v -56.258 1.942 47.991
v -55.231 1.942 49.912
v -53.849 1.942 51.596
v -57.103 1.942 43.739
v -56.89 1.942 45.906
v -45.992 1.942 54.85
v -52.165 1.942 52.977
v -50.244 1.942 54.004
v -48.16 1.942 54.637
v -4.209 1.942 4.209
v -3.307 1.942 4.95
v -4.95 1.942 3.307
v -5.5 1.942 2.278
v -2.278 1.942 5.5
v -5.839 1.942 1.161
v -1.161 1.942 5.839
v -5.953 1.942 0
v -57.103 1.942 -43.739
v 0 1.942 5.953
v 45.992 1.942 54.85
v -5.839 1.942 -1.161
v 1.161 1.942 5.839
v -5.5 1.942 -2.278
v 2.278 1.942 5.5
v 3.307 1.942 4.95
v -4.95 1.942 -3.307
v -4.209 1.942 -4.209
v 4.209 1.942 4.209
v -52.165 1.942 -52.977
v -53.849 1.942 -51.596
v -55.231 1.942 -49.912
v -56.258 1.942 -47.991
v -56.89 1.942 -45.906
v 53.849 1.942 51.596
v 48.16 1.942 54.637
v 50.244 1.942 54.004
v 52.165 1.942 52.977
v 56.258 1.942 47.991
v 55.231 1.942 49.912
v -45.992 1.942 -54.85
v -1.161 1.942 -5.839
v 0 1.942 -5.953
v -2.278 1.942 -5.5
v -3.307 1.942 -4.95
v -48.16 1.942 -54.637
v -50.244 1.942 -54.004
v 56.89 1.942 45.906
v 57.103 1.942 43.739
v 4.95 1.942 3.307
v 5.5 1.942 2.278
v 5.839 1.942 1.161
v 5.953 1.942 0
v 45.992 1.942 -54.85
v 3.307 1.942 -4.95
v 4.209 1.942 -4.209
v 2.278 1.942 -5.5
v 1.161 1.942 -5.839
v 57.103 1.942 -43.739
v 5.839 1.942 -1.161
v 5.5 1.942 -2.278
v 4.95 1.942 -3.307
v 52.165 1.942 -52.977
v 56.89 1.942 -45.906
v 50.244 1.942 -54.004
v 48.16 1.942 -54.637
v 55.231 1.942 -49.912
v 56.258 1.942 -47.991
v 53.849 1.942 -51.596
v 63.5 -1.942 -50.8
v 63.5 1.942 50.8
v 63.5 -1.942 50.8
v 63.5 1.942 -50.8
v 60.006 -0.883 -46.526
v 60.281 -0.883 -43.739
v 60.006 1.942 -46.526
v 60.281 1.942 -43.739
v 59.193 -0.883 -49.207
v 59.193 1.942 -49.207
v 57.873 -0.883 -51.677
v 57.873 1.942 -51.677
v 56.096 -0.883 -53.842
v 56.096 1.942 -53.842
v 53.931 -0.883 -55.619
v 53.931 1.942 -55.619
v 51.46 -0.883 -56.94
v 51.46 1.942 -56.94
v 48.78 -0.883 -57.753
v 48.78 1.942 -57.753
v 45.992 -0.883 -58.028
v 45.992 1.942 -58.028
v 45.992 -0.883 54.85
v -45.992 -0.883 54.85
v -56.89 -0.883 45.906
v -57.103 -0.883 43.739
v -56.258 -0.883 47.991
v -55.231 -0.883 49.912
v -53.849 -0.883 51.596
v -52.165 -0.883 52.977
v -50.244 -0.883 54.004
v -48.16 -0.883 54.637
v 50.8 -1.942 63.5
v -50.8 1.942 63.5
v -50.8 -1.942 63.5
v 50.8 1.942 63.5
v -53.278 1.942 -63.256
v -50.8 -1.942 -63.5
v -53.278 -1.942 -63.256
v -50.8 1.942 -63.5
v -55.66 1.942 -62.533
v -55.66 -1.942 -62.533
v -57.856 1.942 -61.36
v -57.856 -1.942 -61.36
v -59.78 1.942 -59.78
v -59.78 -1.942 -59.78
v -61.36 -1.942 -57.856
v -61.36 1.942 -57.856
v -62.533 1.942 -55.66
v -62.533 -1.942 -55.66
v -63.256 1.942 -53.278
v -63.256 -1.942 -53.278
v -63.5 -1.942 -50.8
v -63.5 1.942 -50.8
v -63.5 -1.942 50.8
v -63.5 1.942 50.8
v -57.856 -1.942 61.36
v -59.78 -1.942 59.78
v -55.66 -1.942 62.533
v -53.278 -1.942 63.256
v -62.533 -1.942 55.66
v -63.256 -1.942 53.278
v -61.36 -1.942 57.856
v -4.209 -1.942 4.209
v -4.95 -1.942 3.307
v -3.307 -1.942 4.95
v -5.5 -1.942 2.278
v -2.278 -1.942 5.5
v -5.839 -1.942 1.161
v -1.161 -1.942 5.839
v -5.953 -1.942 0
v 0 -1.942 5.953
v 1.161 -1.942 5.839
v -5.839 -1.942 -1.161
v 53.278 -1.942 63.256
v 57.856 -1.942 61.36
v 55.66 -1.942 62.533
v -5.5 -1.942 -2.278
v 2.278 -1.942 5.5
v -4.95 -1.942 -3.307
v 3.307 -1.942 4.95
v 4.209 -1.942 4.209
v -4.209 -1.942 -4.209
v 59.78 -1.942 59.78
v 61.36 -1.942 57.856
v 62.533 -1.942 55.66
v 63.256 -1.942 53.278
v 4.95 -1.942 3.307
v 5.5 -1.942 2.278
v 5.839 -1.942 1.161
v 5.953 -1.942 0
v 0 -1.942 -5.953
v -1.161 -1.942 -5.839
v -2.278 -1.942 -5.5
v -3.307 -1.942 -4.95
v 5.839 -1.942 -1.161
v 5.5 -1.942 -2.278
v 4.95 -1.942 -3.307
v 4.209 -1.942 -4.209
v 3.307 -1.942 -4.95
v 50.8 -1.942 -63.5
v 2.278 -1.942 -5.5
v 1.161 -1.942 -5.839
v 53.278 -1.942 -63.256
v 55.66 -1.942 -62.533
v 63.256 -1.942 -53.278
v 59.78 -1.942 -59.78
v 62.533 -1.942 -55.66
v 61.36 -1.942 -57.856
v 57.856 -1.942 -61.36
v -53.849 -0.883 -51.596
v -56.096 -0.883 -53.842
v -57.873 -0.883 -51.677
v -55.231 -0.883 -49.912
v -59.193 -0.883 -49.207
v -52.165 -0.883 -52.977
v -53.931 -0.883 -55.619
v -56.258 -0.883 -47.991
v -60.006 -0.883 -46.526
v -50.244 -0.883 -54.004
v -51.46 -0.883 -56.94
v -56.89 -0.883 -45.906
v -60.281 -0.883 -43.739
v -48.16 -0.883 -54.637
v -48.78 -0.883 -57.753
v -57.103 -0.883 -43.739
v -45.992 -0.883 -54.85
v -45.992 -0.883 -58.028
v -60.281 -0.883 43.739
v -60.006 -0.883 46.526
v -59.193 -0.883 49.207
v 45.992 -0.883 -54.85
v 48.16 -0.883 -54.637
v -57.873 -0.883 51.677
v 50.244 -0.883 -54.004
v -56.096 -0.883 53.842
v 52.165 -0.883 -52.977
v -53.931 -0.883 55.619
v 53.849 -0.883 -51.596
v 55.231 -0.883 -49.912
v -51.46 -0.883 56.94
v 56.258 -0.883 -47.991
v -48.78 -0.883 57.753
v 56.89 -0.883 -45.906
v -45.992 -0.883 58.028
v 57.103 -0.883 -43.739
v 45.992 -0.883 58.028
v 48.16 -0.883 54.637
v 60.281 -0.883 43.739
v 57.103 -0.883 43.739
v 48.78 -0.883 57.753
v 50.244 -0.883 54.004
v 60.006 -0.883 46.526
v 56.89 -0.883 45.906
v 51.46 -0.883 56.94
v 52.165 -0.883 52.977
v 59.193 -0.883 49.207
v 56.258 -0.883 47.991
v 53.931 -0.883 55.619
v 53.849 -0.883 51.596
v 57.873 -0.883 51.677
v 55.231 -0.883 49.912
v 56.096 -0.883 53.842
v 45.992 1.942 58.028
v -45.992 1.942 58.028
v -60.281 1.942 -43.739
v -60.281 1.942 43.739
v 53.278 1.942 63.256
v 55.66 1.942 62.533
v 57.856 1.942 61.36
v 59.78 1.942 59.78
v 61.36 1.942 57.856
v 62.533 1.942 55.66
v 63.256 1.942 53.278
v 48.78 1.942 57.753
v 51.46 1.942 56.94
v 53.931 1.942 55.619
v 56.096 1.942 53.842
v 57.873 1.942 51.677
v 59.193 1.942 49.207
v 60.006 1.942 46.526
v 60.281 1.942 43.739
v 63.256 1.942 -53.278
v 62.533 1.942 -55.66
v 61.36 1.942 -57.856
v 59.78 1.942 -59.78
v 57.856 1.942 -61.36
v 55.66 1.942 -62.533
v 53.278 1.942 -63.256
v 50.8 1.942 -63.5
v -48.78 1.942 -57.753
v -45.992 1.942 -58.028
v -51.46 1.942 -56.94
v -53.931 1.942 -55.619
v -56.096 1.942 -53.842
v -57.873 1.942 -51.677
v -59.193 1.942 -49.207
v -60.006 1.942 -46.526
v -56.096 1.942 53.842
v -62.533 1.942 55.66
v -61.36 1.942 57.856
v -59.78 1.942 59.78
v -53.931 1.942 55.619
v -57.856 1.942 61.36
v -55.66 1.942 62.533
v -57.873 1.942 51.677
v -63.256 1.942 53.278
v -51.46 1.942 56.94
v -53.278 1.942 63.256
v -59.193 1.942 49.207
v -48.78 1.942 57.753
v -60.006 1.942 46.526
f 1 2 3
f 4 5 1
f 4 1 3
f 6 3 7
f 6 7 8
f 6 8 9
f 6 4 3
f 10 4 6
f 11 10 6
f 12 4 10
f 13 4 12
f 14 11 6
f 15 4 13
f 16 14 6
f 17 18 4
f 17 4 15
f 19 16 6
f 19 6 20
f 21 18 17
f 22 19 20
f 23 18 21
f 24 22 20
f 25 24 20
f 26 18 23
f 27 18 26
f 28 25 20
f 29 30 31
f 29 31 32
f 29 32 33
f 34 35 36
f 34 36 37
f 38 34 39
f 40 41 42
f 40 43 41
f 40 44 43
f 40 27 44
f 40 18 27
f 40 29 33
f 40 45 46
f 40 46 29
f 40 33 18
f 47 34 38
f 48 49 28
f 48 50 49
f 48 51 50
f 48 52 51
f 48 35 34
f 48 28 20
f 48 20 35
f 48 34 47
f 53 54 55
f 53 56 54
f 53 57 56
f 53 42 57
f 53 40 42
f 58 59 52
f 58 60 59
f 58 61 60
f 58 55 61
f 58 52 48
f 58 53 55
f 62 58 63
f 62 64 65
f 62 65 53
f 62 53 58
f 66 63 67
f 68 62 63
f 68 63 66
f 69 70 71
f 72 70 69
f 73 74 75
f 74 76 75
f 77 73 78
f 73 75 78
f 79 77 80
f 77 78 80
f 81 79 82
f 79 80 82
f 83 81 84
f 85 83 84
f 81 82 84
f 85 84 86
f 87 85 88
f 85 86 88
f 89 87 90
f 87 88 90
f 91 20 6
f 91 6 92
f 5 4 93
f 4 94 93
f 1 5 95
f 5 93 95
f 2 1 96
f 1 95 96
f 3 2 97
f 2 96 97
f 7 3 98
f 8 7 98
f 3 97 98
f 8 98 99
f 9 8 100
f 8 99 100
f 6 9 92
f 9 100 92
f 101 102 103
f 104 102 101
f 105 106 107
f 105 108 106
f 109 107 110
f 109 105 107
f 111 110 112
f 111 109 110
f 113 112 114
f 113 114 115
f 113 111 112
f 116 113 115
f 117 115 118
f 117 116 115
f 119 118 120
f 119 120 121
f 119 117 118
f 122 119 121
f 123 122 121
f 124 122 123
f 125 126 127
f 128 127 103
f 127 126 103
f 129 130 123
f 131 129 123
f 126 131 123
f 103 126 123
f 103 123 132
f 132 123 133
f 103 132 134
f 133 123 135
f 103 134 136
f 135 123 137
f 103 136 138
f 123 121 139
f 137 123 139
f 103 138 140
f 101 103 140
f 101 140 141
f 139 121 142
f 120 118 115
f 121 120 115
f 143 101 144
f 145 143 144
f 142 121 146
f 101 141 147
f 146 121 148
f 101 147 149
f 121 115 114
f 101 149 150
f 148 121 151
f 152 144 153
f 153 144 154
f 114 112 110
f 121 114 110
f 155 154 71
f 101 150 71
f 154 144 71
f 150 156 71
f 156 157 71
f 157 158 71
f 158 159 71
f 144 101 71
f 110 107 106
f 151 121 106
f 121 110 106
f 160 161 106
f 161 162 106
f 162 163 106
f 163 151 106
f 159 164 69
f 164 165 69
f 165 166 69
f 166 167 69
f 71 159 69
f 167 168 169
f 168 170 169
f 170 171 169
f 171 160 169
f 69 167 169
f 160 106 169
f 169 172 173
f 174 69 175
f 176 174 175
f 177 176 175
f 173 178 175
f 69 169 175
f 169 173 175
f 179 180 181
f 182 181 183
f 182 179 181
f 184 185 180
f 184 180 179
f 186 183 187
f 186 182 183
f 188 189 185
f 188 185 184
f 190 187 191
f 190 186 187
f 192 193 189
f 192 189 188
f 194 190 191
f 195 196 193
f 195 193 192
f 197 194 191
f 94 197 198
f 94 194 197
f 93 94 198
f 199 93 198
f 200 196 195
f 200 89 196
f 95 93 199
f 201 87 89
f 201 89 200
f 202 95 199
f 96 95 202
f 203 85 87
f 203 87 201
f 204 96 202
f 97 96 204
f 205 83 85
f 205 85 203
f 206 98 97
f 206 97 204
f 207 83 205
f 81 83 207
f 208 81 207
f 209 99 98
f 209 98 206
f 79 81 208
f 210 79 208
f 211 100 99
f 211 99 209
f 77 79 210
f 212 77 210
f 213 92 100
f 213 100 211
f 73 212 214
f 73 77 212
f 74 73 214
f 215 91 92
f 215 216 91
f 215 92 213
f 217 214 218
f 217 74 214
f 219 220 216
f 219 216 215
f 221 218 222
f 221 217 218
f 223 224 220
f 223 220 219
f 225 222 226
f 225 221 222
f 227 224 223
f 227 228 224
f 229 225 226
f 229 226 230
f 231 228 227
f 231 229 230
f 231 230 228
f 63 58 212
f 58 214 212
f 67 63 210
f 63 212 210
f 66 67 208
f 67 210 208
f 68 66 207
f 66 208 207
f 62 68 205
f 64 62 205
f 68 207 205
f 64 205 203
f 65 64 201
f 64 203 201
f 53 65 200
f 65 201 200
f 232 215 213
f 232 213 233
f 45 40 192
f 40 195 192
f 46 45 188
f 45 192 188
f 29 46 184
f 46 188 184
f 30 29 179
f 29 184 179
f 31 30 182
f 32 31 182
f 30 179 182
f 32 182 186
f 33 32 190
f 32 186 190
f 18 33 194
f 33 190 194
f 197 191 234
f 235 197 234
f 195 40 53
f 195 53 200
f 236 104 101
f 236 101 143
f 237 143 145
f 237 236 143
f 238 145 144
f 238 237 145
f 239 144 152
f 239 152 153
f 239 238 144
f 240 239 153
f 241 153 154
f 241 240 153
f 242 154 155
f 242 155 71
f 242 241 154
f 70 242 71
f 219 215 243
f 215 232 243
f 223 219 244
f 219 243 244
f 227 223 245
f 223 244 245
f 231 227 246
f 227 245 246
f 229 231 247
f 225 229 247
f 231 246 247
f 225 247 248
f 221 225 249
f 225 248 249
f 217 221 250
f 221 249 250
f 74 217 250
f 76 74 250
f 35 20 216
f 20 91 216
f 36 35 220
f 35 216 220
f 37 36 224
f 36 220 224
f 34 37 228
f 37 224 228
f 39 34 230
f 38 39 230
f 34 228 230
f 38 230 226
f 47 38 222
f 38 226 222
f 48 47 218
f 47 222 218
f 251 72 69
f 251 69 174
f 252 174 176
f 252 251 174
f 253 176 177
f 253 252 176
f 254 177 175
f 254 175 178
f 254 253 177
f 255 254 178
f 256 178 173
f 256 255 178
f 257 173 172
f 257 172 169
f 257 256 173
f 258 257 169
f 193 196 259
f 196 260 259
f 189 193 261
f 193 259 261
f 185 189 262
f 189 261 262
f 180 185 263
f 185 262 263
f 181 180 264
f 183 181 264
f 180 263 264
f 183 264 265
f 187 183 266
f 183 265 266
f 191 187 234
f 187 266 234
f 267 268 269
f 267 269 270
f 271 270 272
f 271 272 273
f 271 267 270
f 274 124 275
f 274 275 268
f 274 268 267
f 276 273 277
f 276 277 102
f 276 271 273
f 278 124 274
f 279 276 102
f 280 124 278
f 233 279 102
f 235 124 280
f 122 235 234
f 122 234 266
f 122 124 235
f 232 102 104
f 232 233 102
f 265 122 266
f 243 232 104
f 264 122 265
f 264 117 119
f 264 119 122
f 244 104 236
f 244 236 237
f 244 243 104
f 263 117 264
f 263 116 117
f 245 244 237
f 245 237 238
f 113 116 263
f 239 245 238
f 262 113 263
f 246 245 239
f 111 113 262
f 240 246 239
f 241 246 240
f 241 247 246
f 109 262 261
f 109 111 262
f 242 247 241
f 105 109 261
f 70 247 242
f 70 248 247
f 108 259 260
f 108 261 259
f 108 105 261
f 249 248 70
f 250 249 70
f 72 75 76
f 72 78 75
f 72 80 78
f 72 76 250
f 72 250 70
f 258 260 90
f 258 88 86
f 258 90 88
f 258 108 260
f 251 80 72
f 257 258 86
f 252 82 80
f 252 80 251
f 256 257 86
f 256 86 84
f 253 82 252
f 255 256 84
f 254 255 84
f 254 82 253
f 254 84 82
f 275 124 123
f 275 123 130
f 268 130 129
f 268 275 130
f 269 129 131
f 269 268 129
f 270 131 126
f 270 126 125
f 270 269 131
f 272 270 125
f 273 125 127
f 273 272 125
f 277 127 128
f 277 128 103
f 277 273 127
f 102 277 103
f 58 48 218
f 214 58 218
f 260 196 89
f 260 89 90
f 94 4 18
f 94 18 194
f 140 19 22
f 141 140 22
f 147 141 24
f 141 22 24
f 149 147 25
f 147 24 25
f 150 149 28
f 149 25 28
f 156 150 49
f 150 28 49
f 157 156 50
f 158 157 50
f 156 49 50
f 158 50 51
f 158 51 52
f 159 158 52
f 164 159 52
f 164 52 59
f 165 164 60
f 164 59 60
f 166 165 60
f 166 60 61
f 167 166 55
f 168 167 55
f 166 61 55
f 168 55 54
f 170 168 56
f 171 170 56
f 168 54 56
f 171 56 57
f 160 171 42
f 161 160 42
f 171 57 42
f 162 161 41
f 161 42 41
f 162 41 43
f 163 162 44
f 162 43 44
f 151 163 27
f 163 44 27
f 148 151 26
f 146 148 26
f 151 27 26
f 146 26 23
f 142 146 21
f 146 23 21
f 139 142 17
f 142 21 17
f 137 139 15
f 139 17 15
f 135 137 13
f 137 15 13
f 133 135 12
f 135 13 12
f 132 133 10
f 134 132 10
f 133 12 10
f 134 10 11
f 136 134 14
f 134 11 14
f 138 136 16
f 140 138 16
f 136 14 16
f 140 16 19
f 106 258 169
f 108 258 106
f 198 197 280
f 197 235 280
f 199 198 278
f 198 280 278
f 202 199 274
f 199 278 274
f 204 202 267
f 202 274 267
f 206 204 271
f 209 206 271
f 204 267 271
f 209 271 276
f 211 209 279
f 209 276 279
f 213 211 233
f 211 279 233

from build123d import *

# Parameters (mm, degrees)
MAIN_BODY_DEPTH      = 1.94183
SKETCH29_R           = 5.953125
PNEUMATICMOUNT_DEPTH = 3.88366
ORINGINSERTPROFILE_W = 3.17754
ORINGINSERTPROFILE_H = 2.82448


with BuildPart() as part:
    # Sketch1 → main body (new, symmetric)
    with BuildSketch(Plane(origin=(0, 0, 0), x_dir=(1, 0, 0), z_dir=(0, 1, 0))):
        with BuildLine():
            Line((-63.5, 50.8), (-63.5, -50.8))
            ThreePointArc((-63.5, -50.8), (-59.780256121, -59.780256121), (-50.8, -63.5))
            Line((-50.8, -63.5), (50.8, -63.5))
            ThreePointArc((50.8, -63.5), (59.780256121, -59.780256121), (63.5, -50.8))
            Line((63.5, -50.8), (63.5, 50.8))
            ThreePointArc((63.5, 50.8), (59.780256121, 59.780256121), (50.8, 63.5))
            Line((50.8, 63.5), (-50.8, 63.5))
            ThreePointArc((-50.8, 63.5), (-59.780256121, 59.780256121), (-63.5, 50.8))
        make_face()
    extrude(amount=MAIN_BODY_DEPTH, both=True)

    # Sketch29 → PneumaticMount (cut)
    with BuildSketch(Plane(origin=(0, 1.94183, 0), x_dir=(1, 0, 0), z_dir=(0, 1, 0))):
        with Locations(Location((0, 0, 0), (0, 0, 270))):
            Circle(SKETCH29_R)
    extrude(amount=-PNEUMATICMOUNT_DEPTH, mode=Mode.SUBTRACT)

    # O-RingInsert: sweep along a path in ORingInsertPath
    with BuildLine(Plane(origin=(0, 1.94183, 0), x_dir=(1, 0, 0), z_dir=(0, 1, 0))) as o_ringinsert_path:
        Line((-45.992219207, -56.4388), (45.992219207, -56.4388))
        ThreePointArc((45.992219207, -56.4388), (54.972475328, -52.719056121), (58.692219207, -43.7388))
        Line((58.692219207, -43.7388), (58.692219207, 43.7388))
        ThreePointArc((58.692219207, 43.7388), (54.972475328, 52.719056121), (45.992219207, 56.4388))
        Line((45.992219207, 56.4388), (-45.992219207, 56.4388))
        ThreePointArc((-45.992219207, 56.4388), (-54.972475328, 52.719056121), (-58.692219207, 43.7388))
        Line((-58.692219207, 43.7388), (-58.692219207, -43.7388))
        ThreePointArc((-58.692219207, -43.7388), (-54.972475328, -52.719056121), (-45.992219207, -56.4388))
    # ORingInsertProfile → O-RingInsert (sweep, cut)
    with BuildSketch(Plane.XY):
        with Locations((58.692219207, 0.52959)):
            Rectangle(ORINGINSERTPROFILE_W, ORINGINSERTPROFILE_H)
    sweep(path=o_ringinsert_path.line, mode=Mode.SUBTRACT)


solid = part.part
